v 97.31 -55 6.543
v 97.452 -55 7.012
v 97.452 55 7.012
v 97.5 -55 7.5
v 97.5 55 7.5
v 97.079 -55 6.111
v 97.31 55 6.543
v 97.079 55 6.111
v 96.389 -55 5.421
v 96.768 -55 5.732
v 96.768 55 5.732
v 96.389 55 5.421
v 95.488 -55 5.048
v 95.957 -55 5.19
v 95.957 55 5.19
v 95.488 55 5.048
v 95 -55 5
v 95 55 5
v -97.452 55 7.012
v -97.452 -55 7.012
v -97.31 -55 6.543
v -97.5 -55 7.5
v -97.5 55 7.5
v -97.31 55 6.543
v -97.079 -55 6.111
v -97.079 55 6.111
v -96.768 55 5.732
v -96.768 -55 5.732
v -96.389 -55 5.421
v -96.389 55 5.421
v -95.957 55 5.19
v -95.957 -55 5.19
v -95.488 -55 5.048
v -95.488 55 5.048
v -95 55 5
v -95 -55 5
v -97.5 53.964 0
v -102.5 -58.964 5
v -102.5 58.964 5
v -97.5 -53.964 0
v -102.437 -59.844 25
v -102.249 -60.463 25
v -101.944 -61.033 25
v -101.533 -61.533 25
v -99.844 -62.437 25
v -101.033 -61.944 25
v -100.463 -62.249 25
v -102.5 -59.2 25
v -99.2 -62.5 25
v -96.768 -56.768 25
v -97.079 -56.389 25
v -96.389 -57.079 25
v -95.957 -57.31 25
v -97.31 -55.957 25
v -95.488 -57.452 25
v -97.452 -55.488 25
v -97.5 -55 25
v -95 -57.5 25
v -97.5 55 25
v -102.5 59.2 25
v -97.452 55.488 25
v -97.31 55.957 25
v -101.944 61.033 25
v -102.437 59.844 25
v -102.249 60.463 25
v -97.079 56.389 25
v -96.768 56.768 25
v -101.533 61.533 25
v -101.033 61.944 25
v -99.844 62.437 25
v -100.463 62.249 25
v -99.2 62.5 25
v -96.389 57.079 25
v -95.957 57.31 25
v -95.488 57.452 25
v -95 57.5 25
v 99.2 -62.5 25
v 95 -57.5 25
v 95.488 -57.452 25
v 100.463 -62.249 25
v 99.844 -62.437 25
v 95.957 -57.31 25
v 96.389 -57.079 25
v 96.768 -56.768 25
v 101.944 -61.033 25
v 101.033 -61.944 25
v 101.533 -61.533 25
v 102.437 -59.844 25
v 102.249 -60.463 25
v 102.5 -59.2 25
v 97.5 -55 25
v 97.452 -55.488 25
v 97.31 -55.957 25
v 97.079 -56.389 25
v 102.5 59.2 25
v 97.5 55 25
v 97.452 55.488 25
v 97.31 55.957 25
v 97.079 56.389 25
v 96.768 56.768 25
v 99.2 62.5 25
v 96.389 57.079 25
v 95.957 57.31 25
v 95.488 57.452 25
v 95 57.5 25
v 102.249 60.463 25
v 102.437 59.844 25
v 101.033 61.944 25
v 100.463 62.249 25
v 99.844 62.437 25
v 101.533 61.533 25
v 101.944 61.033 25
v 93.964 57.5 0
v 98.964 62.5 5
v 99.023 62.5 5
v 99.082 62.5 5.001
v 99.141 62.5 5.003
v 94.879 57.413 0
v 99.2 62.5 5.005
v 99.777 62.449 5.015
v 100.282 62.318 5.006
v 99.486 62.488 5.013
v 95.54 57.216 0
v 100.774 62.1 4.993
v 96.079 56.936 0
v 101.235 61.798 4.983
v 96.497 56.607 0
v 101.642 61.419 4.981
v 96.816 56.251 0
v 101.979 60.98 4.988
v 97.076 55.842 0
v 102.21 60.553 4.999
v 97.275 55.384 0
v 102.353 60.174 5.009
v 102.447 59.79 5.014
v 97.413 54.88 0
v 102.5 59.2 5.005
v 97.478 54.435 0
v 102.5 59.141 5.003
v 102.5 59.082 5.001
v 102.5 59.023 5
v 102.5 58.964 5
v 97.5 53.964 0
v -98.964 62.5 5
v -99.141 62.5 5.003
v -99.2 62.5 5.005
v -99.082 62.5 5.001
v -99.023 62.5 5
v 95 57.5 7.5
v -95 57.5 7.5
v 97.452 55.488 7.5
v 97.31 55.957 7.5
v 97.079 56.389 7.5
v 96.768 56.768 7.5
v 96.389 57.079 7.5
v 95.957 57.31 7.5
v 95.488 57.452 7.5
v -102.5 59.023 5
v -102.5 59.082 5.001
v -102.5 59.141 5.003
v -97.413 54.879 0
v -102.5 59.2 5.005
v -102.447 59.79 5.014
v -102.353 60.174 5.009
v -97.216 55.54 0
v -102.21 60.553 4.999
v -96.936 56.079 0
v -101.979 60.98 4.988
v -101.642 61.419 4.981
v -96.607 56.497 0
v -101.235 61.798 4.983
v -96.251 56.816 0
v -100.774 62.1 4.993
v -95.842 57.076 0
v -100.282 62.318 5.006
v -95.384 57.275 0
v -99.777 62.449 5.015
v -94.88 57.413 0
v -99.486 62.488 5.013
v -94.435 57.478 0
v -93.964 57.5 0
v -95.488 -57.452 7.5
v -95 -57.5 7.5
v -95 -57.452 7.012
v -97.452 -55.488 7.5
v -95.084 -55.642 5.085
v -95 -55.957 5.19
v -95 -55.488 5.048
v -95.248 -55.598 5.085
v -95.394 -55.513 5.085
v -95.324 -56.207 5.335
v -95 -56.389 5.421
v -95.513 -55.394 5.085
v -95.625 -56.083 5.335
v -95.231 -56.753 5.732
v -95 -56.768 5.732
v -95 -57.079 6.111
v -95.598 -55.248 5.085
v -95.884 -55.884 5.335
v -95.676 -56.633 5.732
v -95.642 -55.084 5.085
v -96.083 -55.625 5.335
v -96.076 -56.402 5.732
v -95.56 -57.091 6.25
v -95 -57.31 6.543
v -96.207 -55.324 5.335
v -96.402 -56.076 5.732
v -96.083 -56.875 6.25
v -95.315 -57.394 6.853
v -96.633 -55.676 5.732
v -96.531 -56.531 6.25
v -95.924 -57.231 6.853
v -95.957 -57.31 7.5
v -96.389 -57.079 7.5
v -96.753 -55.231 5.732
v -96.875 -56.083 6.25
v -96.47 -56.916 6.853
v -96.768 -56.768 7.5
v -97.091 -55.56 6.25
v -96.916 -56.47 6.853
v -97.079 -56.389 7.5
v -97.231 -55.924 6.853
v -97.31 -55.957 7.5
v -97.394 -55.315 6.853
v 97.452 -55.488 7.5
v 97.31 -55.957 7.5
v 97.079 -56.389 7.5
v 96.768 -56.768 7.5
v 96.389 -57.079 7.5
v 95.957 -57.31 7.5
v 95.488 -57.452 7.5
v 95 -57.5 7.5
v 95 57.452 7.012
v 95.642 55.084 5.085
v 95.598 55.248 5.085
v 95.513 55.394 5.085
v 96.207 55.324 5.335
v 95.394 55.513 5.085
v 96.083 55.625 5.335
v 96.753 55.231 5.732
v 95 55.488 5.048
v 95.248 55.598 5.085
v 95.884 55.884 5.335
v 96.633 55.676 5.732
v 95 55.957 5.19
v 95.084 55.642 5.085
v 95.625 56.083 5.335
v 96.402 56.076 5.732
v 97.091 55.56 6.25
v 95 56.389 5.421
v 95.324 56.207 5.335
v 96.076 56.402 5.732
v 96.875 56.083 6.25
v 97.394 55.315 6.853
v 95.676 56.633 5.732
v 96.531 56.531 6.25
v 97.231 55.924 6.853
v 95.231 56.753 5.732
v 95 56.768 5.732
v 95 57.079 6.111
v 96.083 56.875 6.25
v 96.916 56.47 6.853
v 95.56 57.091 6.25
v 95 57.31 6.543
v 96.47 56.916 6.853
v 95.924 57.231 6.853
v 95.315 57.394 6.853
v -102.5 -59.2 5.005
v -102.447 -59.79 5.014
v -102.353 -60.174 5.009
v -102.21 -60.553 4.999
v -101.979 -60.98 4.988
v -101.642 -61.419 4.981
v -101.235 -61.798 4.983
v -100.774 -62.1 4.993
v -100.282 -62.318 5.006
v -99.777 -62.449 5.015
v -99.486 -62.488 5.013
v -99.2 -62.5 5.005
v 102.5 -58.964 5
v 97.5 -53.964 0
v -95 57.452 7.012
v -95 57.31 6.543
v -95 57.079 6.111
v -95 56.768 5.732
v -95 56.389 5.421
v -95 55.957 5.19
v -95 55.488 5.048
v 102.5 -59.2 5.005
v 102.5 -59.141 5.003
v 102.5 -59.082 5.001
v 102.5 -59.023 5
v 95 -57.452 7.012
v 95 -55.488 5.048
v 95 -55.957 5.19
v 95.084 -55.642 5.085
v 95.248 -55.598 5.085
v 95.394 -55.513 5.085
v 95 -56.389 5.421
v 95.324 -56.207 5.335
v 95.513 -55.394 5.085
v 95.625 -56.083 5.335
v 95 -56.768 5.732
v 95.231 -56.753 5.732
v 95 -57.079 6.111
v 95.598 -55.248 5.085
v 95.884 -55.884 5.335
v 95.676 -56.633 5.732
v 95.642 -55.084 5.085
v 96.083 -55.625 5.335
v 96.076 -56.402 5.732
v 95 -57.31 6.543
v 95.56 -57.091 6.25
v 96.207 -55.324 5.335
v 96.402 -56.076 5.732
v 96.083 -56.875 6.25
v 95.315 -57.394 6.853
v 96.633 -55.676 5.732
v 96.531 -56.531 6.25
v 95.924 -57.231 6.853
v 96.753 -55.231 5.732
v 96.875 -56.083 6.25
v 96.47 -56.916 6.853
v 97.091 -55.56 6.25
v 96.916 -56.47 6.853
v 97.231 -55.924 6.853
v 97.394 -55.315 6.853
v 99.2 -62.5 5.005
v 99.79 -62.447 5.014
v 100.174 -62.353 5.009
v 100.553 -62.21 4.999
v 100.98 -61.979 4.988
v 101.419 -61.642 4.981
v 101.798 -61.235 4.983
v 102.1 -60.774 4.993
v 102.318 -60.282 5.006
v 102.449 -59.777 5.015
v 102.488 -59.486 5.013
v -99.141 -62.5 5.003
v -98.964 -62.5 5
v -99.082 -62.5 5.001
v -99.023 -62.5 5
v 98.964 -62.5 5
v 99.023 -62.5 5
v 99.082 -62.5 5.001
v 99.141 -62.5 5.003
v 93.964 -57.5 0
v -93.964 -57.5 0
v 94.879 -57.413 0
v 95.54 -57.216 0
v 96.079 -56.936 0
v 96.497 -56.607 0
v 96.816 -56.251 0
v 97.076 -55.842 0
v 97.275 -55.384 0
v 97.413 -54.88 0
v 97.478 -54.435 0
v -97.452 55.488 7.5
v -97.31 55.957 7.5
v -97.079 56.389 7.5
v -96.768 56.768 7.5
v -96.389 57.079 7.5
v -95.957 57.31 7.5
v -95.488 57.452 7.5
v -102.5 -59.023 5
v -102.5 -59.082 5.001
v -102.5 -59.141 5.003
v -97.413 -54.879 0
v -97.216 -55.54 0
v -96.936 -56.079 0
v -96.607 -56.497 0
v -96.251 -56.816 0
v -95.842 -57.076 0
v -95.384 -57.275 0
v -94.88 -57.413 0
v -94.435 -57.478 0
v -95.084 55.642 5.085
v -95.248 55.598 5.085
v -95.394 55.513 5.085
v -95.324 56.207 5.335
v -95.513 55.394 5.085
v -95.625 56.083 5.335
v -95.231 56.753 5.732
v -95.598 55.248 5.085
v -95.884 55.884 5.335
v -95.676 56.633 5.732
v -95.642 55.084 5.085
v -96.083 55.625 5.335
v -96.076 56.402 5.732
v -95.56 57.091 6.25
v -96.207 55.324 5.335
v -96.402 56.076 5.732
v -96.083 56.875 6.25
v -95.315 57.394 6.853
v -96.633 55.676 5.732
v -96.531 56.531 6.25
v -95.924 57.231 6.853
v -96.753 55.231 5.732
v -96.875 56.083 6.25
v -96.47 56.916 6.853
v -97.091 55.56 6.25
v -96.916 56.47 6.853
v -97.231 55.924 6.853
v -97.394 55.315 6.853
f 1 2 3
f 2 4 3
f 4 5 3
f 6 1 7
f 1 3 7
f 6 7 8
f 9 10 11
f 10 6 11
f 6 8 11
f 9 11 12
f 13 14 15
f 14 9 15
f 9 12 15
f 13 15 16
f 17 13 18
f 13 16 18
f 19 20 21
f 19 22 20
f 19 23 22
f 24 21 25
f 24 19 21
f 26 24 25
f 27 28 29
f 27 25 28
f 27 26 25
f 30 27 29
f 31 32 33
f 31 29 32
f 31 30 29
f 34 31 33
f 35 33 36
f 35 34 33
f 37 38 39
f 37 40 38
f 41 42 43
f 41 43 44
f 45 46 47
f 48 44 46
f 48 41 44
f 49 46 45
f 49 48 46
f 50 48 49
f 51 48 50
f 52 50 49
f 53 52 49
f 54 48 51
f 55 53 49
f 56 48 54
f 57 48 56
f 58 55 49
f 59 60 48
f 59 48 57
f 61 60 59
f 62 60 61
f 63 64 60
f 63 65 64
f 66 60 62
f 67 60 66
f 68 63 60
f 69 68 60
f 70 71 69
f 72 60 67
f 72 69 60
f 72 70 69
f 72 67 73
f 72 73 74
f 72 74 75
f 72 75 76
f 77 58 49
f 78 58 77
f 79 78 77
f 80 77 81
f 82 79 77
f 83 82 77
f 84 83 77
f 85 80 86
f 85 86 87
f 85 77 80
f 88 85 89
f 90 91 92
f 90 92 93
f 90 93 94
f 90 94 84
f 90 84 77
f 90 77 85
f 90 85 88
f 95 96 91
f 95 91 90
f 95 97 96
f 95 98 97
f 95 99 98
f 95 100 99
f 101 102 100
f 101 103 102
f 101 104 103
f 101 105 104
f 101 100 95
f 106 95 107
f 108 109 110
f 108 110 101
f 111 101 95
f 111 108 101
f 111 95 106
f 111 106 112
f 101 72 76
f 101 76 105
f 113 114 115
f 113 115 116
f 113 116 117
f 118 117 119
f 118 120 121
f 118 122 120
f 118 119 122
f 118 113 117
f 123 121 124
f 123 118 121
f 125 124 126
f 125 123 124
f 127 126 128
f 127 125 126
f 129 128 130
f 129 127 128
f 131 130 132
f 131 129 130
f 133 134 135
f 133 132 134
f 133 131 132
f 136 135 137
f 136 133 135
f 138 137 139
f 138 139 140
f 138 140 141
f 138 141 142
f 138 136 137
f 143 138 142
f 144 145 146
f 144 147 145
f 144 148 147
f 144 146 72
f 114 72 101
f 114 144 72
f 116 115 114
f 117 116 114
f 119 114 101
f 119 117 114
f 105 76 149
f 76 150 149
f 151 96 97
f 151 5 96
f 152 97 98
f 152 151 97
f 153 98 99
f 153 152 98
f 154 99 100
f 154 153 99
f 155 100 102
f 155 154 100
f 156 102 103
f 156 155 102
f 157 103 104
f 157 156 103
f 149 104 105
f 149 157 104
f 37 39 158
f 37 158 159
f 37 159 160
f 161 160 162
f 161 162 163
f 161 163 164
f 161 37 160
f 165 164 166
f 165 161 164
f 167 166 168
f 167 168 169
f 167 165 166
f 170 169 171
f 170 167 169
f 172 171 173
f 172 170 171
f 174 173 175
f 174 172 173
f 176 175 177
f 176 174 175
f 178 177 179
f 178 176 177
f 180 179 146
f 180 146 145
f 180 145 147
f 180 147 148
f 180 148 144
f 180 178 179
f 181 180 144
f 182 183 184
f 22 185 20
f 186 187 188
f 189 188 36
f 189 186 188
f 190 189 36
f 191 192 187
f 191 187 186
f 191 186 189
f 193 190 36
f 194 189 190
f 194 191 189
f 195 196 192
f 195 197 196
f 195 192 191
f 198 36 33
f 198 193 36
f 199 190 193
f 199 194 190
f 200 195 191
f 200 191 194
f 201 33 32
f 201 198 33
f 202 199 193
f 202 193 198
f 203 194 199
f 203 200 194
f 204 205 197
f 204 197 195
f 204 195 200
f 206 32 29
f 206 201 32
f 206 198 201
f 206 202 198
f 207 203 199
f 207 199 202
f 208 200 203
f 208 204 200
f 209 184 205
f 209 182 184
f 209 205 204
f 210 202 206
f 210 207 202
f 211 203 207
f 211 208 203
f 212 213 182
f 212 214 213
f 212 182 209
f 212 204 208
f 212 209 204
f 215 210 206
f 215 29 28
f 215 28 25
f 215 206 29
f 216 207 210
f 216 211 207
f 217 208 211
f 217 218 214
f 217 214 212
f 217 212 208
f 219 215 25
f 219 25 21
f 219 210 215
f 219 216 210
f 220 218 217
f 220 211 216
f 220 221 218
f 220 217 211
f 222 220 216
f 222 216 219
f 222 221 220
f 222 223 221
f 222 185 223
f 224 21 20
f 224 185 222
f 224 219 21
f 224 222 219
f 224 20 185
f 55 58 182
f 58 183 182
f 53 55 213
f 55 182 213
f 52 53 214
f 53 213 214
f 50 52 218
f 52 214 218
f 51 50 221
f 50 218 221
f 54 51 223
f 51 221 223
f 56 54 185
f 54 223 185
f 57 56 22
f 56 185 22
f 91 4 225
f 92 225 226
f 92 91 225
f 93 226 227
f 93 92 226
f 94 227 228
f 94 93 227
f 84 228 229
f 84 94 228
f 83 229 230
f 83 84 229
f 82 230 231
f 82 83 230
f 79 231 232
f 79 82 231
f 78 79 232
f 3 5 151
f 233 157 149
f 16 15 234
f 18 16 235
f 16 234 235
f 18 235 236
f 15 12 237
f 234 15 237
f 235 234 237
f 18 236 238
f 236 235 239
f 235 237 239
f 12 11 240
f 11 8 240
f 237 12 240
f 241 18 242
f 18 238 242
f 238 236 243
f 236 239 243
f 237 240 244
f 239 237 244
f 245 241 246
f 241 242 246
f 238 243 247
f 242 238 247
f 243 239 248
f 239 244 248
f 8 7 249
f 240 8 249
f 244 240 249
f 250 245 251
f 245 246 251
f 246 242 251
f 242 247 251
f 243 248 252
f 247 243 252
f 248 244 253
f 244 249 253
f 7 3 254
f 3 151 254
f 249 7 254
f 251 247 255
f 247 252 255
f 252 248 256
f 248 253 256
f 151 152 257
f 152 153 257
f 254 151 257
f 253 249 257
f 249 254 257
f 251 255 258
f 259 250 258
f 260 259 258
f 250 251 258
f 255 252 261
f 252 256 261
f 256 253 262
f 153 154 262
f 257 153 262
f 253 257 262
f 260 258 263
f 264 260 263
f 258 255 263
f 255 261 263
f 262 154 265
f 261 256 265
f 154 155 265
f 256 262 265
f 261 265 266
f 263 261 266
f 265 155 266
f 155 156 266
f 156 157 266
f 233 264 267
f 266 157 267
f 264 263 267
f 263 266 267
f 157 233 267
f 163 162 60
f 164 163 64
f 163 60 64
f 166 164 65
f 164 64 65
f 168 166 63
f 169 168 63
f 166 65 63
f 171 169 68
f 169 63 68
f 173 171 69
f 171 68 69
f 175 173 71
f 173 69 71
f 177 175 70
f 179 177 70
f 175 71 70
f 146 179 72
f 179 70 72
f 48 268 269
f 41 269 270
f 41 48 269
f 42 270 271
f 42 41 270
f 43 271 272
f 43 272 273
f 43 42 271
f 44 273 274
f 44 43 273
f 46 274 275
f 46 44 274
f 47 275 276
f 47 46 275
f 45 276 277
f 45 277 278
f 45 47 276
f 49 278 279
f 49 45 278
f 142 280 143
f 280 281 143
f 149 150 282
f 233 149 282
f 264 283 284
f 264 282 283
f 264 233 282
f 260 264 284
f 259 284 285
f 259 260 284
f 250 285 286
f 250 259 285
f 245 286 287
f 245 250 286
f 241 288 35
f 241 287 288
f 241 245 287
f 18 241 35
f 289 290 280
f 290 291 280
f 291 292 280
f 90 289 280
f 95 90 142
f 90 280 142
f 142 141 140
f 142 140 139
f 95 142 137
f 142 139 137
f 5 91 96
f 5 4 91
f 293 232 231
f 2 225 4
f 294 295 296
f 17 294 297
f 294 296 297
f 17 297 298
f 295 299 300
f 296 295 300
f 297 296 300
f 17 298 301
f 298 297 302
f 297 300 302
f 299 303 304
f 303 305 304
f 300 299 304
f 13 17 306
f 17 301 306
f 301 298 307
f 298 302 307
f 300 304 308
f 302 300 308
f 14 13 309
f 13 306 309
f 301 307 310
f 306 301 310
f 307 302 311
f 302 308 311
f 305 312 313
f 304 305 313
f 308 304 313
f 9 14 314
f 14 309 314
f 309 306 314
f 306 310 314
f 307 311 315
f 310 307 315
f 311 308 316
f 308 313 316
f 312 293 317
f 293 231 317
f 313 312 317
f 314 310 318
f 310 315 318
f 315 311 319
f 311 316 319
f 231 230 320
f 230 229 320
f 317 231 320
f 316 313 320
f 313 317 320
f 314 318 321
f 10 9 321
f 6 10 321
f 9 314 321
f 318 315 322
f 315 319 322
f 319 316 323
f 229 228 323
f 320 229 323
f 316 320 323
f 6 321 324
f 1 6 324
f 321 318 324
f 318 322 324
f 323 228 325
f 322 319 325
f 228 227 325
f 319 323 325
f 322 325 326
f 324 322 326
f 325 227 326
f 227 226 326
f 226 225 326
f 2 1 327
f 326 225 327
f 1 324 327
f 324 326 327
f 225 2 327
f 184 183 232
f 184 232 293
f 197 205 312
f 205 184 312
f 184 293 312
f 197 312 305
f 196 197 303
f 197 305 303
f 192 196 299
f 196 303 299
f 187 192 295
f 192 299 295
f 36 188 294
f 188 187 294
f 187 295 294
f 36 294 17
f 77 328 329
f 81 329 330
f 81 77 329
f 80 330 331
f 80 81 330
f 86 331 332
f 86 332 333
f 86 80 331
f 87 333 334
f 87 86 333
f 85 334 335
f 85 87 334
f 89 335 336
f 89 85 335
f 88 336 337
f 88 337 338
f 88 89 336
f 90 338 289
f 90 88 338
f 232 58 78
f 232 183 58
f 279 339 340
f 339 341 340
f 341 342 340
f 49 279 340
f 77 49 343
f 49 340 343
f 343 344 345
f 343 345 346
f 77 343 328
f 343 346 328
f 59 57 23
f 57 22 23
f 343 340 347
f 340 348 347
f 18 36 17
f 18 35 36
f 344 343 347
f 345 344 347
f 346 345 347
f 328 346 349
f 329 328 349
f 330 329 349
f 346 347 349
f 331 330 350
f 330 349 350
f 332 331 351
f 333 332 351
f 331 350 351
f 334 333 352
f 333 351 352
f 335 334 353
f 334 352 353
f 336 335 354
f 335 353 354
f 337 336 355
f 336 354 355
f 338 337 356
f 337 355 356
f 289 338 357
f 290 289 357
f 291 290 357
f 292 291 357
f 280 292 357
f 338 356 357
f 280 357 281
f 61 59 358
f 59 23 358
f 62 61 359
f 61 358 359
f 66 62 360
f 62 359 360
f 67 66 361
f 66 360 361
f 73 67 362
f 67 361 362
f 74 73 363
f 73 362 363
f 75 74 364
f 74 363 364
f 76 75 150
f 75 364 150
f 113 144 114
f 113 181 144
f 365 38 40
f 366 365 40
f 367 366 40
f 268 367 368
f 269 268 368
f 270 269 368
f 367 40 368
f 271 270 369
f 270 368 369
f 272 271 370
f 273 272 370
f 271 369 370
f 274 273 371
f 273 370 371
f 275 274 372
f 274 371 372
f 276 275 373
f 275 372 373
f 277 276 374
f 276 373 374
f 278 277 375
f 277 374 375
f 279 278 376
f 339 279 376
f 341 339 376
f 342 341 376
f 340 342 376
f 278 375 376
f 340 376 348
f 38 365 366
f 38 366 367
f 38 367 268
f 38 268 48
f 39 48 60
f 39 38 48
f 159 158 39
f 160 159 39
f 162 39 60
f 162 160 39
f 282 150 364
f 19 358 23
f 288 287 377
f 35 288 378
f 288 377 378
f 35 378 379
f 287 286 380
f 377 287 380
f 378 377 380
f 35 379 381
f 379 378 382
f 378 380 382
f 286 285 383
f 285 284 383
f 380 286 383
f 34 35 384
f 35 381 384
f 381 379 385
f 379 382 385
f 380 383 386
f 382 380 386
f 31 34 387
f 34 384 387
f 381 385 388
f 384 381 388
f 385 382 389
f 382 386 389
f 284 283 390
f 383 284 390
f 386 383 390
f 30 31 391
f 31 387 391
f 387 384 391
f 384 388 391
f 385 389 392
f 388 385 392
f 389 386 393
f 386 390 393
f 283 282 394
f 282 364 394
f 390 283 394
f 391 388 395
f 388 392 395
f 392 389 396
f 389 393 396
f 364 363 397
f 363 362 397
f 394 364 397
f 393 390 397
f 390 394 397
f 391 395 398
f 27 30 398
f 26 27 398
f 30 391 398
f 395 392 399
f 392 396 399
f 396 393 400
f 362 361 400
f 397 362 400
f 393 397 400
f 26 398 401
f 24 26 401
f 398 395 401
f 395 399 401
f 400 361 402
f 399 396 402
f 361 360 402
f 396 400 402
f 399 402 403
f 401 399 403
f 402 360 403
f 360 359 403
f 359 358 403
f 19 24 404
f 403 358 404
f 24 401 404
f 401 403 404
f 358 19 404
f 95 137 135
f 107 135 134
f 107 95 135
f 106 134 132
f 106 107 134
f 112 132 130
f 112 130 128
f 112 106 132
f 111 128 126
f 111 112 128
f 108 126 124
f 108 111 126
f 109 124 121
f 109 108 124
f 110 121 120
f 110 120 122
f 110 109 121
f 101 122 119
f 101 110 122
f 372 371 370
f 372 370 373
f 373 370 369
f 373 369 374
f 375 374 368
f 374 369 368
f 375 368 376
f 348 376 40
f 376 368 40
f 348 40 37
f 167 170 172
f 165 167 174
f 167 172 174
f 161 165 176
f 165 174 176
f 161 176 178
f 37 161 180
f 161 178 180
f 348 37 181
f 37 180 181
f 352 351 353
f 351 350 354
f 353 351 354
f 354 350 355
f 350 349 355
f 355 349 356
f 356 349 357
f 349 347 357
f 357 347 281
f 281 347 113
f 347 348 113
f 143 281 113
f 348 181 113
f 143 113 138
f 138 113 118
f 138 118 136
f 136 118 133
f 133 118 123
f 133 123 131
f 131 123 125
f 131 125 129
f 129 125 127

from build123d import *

# Parameters (mm, degrees)
F2_W     = 205
F2_H     = 125
F3_DEPTH = 25
F4_T     = -5
F5_SIZE  = 5
F6_R     = 5
F7_R     = 2.5
F8_R     = 3.3


with BuildPart() as f3:
    # F2 (on Top) → F3 (new body)
    with BuildSketch(Plane.XY):
        Rectangle(F2_W, F2_H)
    extrude(amount=F3_DEPTH)

    # F4
    f4_openings = [f3.faces().sort_by_distance(p)[0] for p in [
        (0, 0, 25),
    ]]
    offset(amount=F4_T, openings=f4_openings)

    # F5
    f5_edges = [f3.edges().sort_by_distance(p)[0] for p in [
        (0, 62.5, 0),
        (-102.5, 0, 0),
        (0, -62.5, 0),
        (102.5, 0, 0),
    ]]
    chamfer(f5_edges, length=F5_SIZE)

    # F6
    f6_edges = [f3.edges().sort_by_distance(p)[0] for p in [
        (100, -60, 2.5),
        (-100, 60, 2.5),
        (-100, -60, 2.5),
        (100, 60, 2.5),
    ]]
    fillet(f6_edges, radius=F6_R)

    # F7
    f7_edges = [f3.edges().sort_by_distance(p)[0] for p in [
        (-97.5, -57.5, 15),
        (-97.5, 57.5, 15),
        (97.5, 57.5, 15),
        (97.5, -57.5, 15),
        (0, -57.5, 5),
        (97.5, 0, 5),
        (0, 57.5, 5),
        (-97.5, 0, 5),
    ]]
    fillet(f7_edges, radius=F7_R)

    # F8
    f8_edges = [f3.edges().sort_by_distance(p)[0] for p in [
        (102.5, 62.5, 15.473672),
        (102.5, -62.5, 15.473672),
        (-102.5, -62.5, 15.473672),
        (-102.5, 62.5, 15.473672),
    ]]
    fillet(f8_edges, radius=F8_R)


solid = f3.part
